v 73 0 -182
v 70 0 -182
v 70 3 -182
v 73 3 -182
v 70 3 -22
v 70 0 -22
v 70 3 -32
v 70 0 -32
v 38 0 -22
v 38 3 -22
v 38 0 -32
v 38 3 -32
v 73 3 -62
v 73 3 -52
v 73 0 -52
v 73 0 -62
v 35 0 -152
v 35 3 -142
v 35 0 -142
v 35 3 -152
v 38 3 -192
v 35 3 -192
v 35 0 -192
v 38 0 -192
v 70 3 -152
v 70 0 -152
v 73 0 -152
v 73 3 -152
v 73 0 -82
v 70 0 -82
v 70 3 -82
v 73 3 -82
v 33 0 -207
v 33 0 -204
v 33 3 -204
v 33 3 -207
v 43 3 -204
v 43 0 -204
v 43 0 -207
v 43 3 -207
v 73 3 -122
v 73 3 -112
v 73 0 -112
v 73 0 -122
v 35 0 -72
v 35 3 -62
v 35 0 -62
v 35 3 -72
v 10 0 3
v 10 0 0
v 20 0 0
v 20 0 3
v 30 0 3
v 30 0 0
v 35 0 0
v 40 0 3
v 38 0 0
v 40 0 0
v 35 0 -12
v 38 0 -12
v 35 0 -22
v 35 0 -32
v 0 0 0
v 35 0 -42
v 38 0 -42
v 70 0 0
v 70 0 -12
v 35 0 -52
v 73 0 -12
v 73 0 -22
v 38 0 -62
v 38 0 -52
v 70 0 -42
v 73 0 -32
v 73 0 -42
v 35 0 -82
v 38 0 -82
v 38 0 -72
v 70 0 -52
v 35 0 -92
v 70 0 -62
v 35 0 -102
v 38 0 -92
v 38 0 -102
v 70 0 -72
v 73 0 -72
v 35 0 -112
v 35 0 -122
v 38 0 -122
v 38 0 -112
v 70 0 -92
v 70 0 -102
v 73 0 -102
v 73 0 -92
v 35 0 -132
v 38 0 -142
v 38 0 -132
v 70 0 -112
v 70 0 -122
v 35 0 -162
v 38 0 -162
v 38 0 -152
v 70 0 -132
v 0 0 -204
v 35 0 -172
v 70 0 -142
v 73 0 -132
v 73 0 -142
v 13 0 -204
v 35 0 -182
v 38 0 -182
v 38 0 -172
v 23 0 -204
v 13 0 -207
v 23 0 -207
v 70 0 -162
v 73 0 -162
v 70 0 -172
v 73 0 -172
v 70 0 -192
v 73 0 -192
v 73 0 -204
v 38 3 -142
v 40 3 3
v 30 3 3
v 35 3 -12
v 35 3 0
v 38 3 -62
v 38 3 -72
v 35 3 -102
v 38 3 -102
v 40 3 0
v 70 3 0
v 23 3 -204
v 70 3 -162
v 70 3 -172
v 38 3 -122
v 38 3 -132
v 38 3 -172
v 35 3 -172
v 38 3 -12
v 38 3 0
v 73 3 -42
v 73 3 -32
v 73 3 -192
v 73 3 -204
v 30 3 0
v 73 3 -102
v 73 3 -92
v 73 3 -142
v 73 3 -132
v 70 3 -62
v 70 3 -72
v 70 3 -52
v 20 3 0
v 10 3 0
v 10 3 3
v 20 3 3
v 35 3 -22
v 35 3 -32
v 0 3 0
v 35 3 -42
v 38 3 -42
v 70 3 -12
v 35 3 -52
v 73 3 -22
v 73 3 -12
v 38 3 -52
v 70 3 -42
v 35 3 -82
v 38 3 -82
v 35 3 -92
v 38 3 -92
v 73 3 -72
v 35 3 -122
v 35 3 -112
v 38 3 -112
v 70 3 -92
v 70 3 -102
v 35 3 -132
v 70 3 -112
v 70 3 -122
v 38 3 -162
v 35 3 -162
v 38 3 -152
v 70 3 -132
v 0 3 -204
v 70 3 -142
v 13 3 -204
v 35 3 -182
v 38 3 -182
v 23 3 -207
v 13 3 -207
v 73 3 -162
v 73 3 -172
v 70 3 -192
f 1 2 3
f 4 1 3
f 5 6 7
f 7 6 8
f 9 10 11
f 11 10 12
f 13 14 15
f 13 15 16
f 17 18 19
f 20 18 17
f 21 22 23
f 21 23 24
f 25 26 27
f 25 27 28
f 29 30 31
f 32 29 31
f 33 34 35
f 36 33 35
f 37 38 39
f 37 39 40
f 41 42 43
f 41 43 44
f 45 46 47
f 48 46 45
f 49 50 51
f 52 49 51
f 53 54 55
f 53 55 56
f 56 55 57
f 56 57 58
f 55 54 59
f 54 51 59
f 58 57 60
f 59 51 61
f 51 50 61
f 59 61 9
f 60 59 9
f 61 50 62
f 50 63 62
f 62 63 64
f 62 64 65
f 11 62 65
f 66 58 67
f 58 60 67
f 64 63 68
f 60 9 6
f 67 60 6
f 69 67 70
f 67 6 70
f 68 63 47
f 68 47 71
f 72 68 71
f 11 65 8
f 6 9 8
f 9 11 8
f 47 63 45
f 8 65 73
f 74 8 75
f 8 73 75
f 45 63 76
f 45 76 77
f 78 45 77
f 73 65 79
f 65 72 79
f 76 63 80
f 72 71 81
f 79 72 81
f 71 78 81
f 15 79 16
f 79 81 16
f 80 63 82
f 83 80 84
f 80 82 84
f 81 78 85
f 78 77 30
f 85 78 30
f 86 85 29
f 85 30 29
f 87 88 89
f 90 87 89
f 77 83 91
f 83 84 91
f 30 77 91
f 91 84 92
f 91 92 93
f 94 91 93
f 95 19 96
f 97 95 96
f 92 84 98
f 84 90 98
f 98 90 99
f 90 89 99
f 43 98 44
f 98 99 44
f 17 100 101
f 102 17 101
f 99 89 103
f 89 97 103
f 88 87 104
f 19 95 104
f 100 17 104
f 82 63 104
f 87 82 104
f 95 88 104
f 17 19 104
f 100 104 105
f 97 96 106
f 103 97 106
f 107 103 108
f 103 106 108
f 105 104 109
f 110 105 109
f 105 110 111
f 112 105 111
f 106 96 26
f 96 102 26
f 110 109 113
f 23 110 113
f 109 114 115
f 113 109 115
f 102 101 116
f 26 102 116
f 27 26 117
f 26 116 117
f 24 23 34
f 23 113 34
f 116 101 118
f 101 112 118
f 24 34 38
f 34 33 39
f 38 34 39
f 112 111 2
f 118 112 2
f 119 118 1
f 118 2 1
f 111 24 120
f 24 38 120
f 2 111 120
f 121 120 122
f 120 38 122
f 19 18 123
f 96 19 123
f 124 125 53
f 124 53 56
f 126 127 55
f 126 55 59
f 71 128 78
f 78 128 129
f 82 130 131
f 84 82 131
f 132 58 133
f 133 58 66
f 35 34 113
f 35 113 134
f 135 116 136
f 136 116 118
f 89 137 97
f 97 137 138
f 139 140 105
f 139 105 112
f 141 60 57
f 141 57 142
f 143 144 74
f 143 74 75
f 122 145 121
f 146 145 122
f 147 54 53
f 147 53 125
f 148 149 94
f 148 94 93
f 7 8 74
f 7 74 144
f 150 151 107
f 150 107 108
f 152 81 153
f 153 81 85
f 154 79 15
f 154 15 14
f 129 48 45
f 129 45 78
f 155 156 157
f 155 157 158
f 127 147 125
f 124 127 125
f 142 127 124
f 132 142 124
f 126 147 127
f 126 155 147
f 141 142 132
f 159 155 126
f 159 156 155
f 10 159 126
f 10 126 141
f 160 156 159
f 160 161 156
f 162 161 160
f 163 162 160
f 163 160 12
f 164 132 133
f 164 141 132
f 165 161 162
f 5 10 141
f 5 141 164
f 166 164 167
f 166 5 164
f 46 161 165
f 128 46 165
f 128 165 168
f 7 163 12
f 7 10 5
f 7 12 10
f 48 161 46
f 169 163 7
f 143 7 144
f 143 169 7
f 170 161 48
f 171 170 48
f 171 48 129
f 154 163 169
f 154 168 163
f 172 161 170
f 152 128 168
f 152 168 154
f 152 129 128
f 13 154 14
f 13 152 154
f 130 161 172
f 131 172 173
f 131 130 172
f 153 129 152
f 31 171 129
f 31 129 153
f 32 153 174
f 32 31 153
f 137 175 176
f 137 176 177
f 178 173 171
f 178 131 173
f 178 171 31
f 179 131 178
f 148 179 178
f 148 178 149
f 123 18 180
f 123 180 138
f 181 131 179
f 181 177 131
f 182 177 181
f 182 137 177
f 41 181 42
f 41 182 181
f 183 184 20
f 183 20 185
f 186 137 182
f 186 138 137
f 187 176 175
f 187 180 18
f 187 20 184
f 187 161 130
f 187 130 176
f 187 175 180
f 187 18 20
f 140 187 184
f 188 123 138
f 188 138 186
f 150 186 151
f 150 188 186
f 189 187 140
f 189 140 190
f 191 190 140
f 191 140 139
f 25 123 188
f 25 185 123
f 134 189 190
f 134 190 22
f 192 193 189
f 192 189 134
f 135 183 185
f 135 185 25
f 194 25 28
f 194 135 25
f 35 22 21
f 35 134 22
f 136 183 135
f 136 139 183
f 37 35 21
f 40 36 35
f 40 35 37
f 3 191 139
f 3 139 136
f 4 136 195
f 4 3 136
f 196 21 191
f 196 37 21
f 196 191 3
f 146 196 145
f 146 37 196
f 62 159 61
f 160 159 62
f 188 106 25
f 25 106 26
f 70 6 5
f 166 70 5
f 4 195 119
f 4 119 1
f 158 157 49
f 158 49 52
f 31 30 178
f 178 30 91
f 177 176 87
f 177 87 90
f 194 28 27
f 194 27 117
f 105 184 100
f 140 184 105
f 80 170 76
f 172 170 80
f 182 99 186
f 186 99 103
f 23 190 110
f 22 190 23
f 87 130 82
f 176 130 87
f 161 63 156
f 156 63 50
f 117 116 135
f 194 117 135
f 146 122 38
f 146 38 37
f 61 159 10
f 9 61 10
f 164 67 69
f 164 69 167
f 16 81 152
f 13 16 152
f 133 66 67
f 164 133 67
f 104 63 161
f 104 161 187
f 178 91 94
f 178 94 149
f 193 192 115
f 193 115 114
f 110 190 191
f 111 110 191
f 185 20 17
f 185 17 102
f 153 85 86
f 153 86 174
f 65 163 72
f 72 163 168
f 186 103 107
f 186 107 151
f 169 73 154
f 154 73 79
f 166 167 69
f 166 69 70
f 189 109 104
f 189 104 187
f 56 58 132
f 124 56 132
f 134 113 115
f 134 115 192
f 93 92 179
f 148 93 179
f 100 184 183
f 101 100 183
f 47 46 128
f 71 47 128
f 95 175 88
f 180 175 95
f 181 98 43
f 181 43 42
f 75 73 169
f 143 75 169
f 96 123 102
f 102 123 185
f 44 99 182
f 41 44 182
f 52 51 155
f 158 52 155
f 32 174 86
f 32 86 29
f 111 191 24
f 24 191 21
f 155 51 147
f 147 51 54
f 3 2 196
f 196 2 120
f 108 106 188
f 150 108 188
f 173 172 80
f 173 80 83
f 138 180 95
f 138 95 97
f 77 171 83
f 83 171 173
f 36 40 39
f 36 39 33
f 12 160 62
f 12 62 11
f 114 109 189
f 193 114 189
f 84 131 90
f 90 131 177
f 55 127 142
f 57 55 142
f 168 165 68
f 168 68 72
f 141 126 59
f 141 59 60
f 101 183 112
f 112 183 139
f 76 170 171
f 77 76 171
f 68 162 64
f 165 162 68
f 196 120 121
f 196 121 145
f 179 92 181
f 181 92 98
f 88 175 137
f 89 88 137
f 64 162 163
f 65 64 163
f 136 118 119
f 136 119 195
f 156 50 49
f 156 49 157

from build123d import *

# Parameters (mm, degrees)
SKETCH1_W                  = 70
SKETCH1_H                  = 204
BOSS_EXTRUDE1_DEPTH        = 3
SKETCH2_W                  = 12
SKETCH2_H                  = 3
SKETCH2_W_2                = 10
BOSS_EXTRUDE2_DEPTH        = 3
ESQUISSE4_W                = 3
ESQUISSE4_H                = 10
ENL_V_MAT_EXTRU_3_DEPTH    = 4
R_P_TITION_LIN_AIRE2_COUNT = 10
R_P_TITION_LIN_AIRE2_PITCH = 20
ESQUISSE5_W                = 3
ESQUISSE5_H                = 3
ENL_V_MAT_EXTRU_4_DEPTH    = 3
ESQUISSE6_W                = 10
ESQUISSE6_H                = 3
BOSS_EXTRU_1_DEPTH         = 3
ESQUISSE7_W                = 10
ESQUISSE7_H                = 3
BOSS_EXTRU_2_DEPTH         = 3


with BuildPart() as part:
    # Sketch1 → Boss-Extrude1 (new body)
    with BuildSketch(Plane(origin=(0, 0, 0), x_dir=(1, 0, 0), z_dir=(0, 1, 0))):
        with Locations((35, 102)):
            Rectangle(SKETCH1_W, SKETCH1_H)
    extrude(amount=BOSS_EXTRUDE1_DEPTH)

    # Sketch2 → Boss-Extrude2 (add)
    with BuildSketch(Plane(origin=(70, 0, 0), x_dir=(0, 0, -1), z_dir=(1, 0, 0))):
        with Locations((198, 1.5)):
            Rectangle(SKETCH2_W, SKETCH2_H)
        with Locations((177, 1.5)):
            Rectangle(SKETCH2_W_2, SKETCH2_H)
        with Locations((157, 1.5)):
            Rectangle(SKETCH2_W_2, SKETCH2_H)
        with Locations((137, 1.5)):
            Rectangle(SKETCH2_W_2, SKETCH2_H)
        with Locations((117, 1.5)):
            Rectangle(SKETCH2_W_2, SKETCH2_H)
        with Locations((97, 1.5)):
            Rectangle(SKETCH2_W_2, SKETCH2_H)
        with Locations((77, 1.5)):
            Rectangle(SKETCH2_W_2, SKETCH2_H)
        with Locations((57, 1.5)):
            Rectangle(SKETCH2_W_2, SKETCH2_H)
        with Locations((37, 1.5)):
            Rectangle(SKETCH2_W_2, SKETCH2_H)
        with Locations((17, 1.5)):
            Rectangle(SKETCH2_W_2, SKETCH2_H)
    extrude(amount=BOSS_EXTRUDE2_DEPTH)

    # Esquisse4 → Enlèv. mat.-Extru.3 (cut, through all)
    with BuildSketch(Plane(origin=(0, 3, 0), x_dir=(1, 0, 0), z_dir=(0, 1, 0))):
        with Locations((36.5, 187)):
            Rectangle(ESQUISSE4_W, ESQUISSE4_H)
    enl_v_mat_extru_3 = extrude(amount=-ENL_V_MAT_EXTRU_3_DEPTH, mode=Mode.SUBTRACT)

    # Répétition linéaire2: Enlèv. mat.-Extru.3 ×10
    with Locations(*[(0, 0, i * R_P_TITION_LIN_AIRE2_PITCH) for i in range(1, R_P_TITION_LIN_AIRE2_COUNT)]):
        add(enl_v_mat_extru_3, mode=Mode.SUBTRACT)

    # Esquisse5 → Enlèv. mat.-Extru.4 (cut, through all)
    with BuildSketch(Plane(origin=(0, 0, -2), x_dir=(-1, 0, 0), z_dir=(0, 0, -1))):
        with Locations((-36.5, 1.5)):
            Rectangle(ESQUISSE5_W, ESQUISSE5_H)
    extrude(amount=-ENL_V_MAT_EXTRU_4_DEPTH, mode=Mode.SUBTRACT)

    # Esquisse6 → Boss.-Extru.1 (add)
    with BuildSketch(Plane.XY):
        with Locations((15, 1.5)):
            Rectangle(ESQUISSE6_W, ESQUISSE6_H)
        with Locations((35, 1.5)):
            Rectangle(ESQUISSE6_W, ESQUISSE6_H)
    extrude(amount=BOSS_EXTRU_1_DEPTH)

    # Esquisse7 → Boss.-Extru.2 (add)
    with BuildSketch(Plane(origin=(0, 0, -204), x_dir=(-1, 0, 0), z_dir=(0, 0, -1))):
        with Locations((-38, 1.5)):
            Rectangle(ESQUISSE7_W, ESQUISSE7_H)
        with Locations((-18, 1.5)):
            Rectangle(ESQUISSE7_W, ESQUISSE7_H)
    extrude(amount=BOSS_EXTRU_2_DEPTH)


solid = part.part
